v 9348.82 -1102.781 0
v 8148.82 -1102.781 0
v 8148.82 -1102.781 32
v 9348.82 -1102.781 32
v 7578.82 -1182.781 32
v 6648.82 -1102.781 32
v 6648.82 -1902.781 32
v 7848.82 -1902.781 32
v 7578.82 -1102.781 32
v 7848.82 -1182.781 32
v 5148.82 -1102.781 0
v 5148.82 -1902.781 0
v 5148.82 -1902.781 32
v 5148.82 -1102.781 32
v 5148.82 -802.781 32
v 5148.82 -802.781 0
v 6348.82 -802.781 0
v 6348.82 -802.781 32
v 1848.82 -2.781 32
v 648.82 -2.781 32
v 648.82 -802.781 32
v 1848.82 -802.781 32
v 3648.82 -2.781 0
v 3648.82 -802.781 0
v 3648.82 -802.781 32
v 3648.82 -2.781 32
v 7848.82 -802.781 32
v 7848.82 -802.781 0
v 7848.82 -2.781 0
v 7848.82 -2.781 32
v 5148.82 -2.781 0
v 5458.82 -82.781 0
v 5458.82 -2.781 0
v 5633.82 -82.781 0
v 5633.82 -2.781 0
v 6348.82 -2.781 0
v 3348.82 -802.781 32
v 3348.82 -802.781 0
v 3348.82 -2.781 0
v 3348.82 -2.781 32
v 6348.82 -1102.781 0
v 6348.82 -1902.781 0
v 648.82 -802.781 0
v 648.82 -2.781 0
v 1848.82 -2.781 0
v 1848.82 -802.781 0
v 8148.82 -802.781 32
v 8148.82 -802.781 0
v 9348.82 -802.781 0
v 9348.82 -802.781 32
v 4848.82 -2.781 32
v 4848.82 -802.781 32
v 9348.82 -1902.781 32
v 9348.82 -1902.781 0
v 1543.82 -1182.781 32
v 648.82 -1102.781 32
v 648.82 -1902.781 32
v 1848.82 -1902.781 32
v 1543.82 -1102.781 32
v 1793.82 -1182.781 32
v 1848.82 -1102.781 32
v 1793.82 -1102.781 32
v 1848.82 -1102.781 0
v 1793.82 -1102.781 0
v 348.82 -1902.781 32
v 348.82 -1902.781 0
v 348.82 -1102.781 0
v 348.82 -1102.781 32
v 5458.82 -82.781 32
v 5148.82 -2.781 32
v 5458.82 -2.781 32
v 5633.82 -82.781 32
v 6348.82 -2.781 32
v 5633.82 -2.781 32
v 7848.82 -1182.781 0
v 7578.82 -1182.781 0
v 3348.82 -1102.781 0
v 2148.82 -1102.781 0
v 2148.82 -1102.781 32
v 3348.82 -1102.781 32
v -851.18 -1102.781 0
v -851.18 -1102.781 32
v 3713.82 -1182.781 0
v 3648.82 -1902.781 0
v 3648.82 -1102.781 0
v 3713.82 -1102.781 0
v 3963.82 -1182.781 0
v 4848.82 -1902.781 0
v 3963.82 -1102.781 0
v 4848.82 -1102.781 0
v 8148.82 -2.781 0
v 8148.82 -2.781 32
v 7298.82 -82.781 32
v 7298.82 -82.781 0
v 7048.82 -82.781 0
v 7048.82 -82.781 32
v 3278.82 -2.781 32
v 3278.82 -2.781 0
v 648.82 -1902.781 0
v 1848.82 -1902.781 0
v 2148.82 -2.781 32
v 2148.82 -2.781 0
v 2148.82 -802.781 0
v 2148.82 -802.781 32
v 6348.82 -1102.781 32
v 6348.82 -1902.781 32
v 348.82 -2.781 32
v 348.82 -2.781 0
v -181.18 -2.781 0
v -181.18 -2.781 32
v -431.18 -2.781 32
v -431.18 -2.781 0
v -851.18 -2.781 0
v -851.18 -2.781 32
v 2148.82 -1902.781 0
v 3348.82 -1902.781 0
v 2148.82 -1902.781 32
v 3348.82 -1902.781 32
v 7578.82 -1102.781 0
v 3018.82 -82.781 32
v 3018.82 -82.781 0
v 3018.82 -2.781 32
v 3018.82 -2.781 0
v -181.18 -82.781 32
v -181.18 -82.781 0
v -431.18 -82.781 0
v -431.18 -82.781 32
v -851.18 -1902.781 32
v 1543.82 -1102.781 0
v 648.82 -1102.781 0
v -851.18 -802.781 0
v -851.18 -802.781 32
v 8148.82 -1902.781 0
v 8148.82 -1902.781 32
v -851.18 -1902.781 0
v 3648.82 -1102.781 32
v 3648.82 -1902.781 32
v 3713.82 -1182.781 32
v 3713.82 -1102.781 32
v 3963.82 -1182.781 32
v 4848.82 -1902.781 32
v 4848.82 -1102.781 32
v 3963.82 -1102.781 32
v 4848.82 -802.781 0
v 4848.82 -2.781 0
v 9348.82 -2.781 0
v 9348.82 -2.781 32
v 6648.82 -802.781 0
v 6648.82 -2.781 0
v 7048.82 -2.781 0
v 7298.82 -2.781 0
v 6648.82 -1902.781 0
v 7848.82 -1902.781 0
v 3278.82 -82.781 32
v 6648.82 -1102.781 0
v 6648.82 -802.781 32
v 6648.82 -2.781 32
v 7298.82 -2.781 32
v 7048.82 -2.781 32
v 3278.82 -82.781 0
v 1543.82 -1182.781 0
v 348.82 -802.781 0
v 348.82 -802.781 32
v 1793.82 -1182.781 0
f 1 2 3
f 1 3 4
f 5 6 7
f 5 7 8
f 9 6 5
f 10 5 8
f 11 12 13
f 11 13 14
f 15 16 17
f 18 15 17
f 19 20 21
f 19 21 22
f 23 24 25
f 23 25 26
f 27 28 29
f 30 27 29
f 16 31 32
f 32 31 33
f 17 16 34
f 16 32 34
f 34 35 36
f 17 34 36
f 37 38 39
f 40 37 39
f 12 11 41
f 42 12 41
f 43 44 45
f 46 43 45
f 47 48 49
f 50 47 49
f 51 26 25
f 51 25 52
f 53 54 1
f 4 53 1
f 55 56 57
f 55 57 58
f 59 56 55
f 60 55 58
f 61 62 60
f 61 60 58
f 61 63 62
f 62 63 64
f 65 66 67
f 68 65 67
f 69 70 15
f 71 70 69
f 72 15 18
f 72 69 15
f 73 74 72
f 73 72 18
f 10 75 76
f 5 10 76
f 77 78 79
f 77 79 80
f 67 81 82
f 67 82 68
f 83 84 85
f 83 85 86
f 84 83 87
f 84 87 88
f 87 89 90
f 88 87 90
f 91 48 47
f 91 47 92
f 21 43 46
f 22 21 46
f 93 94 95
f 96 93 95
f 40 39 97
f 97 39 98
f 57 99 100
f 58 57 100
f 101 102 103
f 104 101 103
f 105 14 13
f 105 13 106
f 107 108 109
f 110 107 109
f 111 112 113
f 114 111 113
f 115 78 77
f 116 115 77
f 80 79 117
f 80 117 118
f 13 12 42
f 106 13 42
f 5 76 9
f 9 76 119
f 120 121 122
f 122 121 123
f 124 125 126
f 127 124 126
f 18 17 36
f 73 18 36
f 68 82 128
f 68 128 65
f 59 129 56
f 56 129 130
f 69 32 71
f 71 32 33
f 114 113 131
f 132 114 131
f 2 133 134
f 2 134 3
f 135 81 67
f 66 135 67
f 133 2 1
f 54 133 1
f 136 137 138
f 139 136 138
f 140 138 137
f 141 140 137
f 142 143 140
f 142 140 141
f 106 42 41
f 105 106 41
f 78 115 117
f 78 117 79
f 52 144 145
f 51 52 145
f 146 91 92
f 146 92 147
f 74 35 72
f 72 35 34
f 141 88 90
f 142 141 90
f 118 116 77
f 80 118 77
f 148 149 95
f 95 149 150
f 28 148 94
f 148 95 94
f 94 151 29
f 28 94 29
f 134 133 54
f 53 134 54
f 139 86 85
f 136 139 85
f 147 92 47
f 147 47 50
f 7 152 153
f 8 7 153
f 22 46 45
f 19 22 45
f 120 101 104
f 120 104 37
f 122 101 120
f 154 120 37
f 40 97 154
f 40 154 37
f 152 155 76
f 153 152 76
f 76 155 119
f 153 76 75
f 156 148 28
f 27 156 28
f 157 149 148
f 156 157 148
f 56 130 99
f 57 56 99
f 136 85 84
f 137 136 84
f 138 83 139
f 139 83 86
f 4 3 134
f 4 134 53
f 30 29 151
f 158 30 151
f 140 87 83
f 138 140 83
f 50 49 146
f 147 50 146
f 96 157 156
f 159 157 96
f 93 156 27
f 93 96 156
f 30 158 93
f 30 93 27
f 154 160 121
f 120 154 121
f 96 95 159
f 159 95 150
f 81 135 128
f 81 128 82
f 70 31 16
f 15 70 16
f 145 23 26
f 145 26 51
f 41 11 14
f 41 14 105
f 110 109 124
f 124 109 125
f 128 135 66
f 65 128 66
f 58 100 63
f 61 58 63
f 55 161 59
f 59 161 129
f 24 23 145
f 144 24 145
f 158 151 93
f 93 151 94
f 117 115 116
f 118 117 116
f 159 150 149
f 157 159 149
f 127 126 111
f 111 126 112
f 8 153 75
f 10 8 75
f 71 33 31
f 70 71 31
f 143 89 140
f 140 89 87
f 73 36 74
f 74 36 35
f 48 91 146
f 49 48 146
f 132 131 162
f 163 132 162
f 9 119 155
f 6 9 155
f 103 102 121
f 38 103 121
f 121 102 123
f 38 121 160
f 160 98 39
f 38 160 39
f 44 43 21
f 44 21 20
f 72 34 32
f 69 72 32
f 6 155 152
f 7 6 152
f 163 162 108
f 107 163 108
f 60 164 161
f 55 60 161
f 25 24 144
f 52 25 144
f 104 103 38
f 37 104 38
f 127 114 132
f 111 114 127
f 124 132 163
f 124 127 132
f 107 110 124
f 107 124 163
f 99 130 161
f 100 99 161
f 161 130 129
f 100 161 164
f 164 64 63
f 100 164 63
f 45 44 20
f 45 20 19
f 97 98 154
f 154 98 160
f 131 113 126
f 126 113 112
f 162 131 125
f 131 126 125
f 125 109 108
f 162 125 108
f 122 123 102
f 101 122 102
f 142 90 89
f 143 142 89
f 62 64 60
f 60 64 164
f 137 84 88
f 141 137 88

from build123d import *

# Parameters (mm, degrees)
F0_W     = 1200
F0_H     = 800
F1_DEPTH = 32


with BuildPart() as f1:
    # F0 (on Top) → F1 (new body)
    with BuildSketch(Plane.XY):
        Polygon((-431.179844, -2.781391), (-851.179844, -2.781391), (-851.179844, -802.781391), (348.820156, -802.781391), (348.820156, -2.781391), (-181.179844, -2.781391), (-181.179844, -82.781391), (-431.179844, -82.781391), align=None)
        with Locations((1248.820156, -402.781391)):
            Rectangle(F0_W, F0_H)
        Polygon((3348.820156, -802.781391), (3348.820156, -2.781391), (3278.820156, -2.781391), (3278.820156, -82.781391), (3018.820156, -82.781391), (3018.820156, -2.781391), (2148.820156, -2.781391), (2148.820156, -802.781391), align=None)
        with Locations((4248.820156, -402.781391)):
            Rectangle(F0_W, F0_H)
        Polygon((6348.820156, -802.781391), (6348.820156, -2.781391), (5633.820156, -2.781391), (5633.820156, -82.781391), (5458.820156, -82.781391), (5458.820156, -2.781391), (5148.820156, -2.781391), (5148.820156, -802.781391), align=None)
        Polygon((7848.820156, -802.781391), (7848.820156, -2.781391), (7298.820156, -2.781391), (7298.820156, -82.781391), (7048.820156, -82.781391), (7048.820156, -2.781391), (6648.820156, -2.781391), (6648.820156, -802.781391), align=None)
        with Locations((8748.820156, -402.781391)):
            Rectangle(F0_W, F0_H)
        with Locations((-251.179844, -1502.781391)):
            Rectangle(F0_W, F0_H)
        Polygon((1848.820156, -1902.781391), (1848.820156, -1102.781391), (1793.820156, -1102.781391), (1793.820156, -1182.781391), (1543.820156, -1182.781391), (1543.820156, -1102.781391), (648.820156, -1102.781391), (648.820156, -1902.781391), align=None)
        with Locations((2748.820156, -1502.781391)):
            Rectangle(F0_W, F0_H)
        Polygon((4848.820156, -1902.781391), (4848.820156, -1102.781391), (3963.820156, -1102.781391), (3963.820156, -1182.781391), (3713.820156, -1182.781391), (3713.820156, -1102.781391), (3648.820156, -1102.781391), (3648.820156, -1902.781391), align=None)
        with Locations((5748.820156, -1502.781391)):
            Rectangle(F0_W, F0_H)
        Polygon((7848.820156, -1902.781391), (7848.820156, -1182.781391), (7578.820156, -1182.781391), (7578.820156, -1102.781391), (6648.820156, -1102.781391), (6648.820156, -1902.781391), align=None)
        with Locations((8748.820156, -1502.781391)):
            Rectangle(F0_W, F0_H)
    extrude(amount=F1_DEPTH)


solid = f1.part
